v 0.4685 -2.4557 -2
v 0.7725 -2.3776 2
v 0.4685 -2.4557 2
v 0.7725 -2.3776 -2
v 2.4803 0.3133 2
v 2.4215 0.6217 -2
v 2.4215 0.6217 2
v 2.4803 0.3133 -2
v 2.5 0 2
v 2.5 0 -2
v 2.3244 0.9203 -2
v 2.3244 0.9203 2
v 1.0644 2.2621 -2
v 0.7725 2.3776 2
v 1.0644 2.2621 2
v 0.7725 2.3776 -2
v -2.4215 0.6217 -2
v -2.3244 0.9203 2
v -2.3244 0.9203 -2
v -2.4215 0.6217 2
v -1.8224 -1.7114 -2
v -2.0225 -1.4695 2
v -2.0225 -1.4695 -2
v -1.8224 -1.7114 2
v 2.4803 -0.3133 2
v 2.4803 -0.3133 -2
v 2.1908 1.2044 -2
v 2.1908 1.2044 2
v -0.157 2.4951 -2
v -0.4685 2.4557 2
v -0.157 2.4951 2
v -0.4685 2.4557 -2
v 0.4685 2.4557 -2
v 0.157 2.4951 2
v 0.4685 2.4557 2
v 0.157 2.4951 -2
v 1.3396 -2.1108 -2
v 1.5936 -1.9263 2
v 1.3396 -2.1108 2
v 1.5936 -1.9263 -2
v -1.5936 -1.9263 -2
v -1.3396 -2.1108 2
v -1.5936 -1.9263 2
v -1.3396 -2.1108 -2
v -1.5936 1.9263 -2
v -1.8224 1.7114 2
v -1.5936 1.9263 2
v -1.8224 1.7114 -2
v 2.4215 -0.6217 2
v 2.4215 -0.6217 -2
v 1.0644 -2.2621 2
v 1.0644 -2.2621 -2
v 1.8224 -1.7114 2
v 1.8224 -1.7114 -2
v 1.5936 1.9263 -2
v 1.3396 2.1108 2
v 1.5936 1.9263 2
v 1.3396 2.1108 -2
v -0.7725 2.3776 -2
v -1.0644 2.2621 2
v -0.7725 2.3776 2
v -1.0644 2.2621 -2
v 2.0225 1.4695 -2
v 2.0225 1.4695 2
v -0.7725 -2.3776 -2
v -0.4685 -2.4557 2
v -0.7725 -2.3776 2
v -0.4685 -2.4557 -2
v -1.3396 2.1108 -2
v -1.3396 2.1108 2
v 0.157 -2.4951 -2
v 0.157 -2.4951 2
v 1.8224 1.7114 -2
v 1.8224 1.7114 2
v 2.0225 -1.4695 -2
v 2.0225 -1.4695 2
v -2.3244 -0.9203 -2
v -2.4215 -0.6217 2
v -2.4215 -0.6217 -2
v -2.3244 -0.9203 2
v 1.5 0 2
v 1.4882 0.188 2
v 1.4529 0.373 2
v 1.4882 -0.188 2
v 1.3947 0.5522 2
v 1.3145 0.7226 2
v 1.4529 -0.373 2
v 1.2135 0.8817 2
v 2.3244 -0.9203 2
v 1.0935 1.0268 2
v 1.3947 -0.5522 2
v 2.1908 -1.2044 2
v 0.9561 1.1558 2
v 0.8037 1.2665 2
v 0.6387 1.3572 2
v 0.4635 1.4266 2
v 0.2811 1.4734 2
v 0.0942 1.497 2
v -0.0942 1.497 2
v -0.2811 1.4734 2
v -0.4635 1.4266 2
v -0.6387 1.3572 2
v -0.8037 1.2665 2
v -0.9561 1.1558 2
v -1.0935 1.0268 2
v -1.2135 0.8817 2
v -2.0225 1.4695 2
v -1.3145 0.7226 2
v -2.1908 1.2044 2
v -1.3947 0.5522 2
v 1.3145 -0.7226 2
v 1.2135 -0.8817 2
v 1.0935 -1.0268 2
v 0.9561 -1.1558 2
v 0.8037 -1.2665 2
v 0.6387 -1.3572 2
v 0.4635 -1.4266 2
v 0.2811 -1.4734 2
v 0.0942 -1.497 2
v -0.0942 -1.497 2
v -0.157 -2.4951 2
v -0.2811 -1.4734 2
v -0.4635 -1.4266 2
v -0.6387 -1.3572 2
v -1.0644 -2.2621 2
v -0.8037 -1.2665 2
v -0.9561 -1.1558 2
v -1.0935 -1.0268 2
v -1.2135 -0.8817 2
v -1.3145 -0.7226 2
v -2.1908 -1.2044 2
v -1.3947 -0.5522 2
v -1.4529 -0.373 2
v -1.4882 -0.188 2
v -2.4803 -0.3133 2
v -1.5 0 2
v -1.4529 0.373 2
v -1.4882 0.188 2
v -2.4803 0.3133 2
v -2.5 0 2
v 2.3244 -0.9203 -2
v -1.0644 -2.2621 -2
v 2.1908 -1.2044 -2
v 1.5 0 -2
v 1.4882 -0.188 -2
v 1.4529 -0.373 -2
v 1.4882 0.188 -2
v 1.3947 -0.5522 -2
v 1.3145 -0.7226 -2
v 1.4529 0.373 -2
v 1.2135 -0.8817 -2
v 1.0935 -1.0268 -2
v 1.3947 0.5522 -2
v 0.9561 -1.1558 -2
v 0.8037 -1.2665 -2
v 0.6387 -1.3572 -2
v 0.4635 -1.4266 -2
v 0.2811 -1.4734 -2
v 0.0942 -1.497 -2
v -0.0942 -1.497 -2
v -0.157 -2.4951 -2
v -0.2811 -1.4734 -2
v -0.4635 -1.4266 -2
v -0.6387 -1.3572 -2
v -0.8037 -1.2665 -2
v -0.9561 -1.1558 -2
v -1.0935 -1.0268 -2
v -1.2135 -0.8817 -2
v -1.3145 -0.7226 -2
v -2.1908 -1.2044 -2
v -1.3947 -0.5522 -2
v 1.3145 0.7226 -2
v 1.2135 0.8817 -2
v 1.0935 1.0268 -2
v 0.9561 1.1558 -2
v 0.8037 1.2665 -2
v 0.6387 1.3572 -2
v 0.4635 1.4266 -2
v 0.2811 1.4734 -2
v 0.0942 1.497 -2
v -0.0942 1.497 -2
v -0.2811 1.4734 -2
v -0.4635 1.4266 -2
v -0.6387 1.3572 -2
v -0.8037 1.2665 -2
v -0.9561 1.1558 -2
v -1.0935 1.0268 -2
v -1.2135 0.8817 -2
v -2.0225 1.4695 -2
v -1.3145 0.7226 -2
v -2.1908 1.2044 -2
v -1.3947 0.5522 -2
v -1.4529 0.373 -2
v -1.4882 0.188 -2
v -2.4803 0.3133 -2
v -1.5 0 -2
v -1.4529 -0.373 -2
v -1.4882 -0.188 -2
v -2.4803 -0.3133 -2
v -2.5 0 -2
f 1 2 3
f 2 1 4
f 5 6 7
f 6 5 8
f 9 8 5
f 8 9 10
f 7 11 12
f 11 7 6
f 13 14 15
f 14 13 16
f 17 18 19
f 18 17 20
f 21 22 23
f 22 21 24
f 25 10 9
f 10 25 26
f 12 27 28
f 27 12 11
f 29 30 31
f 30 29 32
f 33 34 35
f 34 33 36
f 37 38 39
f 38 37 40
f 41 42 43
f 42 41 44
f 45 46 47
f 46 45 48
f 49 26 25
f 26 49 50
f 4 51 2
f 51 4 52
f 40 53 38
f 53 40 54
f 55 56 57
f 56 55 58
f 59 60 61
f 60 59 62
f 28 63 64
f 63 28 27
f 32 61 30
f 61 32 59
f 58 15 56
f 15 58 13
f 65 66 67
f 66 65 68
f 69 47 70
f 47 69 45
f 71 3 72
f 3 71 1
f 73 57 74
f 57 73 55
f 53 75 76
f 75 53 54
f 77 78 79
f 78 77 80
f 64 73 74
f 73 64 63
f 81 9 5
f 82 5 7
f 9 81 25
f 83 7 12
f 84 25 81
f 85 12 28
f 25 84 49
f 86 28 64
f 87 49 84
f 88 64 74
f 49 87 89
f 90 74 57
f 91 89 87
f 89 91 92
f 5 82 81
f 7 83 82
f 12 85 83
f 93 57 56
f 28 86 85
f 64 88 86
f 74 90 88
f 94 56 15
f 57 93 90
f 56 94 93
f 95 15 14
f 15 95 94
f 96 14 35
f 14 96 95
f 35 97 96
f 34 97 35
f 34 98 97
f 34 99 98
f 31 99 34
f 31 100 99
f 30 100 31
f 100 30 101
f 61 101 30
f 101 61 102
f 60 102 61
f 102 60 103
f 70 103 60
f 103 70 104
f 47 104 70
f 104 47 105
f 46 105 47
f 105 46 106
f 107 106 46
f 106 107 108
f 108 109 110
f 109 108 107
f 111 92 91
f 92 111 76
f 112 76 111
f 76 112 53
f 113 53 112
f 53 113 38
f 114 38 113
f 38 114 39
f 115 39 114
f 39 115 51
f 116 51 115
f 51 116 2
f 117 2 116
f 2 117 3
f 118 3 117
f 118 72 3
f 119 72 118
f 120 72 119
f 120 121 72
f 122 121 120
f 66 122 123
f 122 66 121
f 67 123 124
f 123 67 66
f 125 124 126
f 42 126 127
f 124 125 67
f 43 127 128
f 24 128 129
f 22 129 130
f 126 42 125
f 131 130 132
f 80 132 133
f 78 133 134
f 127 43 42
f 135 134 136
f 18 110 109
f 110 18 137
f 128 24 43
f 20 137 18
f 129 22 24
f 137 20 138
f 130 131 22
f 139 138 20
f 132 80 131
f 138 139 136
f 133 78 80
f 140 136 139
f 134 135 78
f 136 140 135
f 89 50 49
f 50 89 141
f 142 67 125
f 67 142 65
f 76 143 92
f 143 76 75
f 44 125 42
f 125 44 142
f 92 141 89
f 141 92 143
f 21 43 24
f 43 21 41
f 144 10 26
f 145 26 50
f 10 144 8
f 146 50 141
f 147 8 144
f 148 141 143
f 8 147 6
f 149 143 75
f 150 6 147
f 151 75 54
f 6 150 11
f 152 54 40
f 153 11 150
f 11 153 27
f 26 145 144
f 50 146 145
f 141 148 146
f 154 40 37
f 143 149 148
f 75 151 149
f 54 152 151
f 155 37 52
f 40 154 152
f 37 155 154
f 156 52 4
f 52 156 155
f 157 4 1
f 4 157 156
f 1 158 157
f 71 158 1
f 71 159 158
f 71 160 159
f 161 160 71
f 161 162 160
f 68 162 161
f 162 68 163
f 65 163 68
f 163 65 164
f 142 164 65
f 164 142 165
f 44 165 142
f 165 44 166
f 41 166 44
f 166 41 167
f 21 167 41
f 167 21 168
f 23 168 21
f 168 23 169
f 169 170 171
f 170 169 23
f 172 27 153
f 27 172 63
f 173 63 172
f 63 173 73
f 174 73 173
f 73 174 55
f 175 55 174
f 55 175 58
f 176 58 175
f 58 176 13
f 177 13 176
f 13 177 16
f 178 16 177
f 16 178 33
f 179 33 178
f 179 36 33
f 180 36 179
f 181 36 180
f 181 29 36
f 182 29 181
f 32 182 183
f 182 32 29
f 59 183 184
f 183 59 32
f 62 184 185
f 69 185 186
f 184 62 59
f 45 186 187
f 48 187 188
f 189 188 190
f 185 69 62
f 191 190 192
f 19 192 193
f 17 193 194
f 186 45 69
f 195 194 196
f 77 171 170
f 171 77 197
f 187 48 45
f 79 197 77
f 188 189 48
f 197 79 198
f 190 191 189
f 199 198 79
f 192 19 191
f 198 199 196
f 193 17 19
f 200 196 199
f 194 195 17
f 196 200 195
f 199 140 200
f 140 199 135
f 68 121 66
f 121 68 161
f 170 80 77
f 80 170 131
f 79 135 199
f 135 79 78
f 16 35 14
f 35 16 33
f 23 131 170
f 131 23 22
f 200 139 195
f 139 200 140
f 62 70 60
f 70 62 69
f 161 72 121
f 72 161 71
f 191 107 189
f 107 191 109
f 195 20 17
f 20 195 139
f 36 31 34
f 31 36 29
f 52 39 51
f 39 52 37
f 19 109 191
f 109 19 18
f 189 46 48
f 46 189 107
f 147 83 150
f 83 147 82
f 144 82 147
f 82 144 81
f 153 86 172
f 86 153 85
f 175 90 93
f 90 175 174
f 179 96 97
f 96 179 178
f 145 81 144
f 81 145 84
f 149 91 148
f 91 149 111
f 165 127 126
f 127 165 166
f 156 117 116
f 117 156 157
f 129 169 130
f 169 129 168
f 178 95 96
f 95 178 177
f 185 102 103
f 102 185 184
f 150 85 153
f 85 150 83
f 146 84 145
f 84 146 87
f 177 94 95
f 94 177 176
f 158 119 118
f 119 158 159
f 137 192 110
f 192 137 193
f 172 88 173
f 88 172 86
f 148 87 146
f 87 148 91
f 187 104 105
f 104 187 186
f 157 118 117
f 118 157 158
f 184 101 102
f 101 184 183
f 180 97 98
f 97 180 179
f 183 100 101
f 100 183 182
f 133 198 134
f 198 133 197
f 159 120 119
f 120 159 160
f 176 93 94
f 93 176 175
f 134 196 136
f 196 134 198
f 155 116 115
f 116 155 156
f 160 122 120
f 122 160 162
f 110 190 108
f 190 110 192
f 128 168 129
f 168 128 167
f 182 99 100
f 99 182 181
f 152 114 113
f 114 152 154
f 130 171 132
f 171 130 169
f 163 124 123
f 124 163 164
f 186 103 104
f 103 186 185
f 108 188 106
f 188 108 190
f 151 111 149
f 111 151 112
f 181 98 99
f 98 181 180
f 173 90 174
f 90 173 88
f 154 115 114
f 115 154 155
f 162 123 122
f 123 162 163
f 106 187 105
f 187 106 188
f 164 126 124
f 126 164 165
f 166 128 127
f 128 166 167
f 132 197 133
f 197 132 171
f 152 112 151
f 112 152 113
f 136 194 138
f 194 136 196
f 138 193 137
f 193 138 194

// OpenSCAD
$fn = 50;


difference() {
	union() {
		translate(v = [0, 0, -2.0000000000]) {
			cylinder(h = 4, r = 2.5000000000);
		}
	}
	union() {
		translate(v = [0, 0, -100.0000000000]) {
			cylinder(h = 200, r = 1.5000000000);
		}
	}
}
